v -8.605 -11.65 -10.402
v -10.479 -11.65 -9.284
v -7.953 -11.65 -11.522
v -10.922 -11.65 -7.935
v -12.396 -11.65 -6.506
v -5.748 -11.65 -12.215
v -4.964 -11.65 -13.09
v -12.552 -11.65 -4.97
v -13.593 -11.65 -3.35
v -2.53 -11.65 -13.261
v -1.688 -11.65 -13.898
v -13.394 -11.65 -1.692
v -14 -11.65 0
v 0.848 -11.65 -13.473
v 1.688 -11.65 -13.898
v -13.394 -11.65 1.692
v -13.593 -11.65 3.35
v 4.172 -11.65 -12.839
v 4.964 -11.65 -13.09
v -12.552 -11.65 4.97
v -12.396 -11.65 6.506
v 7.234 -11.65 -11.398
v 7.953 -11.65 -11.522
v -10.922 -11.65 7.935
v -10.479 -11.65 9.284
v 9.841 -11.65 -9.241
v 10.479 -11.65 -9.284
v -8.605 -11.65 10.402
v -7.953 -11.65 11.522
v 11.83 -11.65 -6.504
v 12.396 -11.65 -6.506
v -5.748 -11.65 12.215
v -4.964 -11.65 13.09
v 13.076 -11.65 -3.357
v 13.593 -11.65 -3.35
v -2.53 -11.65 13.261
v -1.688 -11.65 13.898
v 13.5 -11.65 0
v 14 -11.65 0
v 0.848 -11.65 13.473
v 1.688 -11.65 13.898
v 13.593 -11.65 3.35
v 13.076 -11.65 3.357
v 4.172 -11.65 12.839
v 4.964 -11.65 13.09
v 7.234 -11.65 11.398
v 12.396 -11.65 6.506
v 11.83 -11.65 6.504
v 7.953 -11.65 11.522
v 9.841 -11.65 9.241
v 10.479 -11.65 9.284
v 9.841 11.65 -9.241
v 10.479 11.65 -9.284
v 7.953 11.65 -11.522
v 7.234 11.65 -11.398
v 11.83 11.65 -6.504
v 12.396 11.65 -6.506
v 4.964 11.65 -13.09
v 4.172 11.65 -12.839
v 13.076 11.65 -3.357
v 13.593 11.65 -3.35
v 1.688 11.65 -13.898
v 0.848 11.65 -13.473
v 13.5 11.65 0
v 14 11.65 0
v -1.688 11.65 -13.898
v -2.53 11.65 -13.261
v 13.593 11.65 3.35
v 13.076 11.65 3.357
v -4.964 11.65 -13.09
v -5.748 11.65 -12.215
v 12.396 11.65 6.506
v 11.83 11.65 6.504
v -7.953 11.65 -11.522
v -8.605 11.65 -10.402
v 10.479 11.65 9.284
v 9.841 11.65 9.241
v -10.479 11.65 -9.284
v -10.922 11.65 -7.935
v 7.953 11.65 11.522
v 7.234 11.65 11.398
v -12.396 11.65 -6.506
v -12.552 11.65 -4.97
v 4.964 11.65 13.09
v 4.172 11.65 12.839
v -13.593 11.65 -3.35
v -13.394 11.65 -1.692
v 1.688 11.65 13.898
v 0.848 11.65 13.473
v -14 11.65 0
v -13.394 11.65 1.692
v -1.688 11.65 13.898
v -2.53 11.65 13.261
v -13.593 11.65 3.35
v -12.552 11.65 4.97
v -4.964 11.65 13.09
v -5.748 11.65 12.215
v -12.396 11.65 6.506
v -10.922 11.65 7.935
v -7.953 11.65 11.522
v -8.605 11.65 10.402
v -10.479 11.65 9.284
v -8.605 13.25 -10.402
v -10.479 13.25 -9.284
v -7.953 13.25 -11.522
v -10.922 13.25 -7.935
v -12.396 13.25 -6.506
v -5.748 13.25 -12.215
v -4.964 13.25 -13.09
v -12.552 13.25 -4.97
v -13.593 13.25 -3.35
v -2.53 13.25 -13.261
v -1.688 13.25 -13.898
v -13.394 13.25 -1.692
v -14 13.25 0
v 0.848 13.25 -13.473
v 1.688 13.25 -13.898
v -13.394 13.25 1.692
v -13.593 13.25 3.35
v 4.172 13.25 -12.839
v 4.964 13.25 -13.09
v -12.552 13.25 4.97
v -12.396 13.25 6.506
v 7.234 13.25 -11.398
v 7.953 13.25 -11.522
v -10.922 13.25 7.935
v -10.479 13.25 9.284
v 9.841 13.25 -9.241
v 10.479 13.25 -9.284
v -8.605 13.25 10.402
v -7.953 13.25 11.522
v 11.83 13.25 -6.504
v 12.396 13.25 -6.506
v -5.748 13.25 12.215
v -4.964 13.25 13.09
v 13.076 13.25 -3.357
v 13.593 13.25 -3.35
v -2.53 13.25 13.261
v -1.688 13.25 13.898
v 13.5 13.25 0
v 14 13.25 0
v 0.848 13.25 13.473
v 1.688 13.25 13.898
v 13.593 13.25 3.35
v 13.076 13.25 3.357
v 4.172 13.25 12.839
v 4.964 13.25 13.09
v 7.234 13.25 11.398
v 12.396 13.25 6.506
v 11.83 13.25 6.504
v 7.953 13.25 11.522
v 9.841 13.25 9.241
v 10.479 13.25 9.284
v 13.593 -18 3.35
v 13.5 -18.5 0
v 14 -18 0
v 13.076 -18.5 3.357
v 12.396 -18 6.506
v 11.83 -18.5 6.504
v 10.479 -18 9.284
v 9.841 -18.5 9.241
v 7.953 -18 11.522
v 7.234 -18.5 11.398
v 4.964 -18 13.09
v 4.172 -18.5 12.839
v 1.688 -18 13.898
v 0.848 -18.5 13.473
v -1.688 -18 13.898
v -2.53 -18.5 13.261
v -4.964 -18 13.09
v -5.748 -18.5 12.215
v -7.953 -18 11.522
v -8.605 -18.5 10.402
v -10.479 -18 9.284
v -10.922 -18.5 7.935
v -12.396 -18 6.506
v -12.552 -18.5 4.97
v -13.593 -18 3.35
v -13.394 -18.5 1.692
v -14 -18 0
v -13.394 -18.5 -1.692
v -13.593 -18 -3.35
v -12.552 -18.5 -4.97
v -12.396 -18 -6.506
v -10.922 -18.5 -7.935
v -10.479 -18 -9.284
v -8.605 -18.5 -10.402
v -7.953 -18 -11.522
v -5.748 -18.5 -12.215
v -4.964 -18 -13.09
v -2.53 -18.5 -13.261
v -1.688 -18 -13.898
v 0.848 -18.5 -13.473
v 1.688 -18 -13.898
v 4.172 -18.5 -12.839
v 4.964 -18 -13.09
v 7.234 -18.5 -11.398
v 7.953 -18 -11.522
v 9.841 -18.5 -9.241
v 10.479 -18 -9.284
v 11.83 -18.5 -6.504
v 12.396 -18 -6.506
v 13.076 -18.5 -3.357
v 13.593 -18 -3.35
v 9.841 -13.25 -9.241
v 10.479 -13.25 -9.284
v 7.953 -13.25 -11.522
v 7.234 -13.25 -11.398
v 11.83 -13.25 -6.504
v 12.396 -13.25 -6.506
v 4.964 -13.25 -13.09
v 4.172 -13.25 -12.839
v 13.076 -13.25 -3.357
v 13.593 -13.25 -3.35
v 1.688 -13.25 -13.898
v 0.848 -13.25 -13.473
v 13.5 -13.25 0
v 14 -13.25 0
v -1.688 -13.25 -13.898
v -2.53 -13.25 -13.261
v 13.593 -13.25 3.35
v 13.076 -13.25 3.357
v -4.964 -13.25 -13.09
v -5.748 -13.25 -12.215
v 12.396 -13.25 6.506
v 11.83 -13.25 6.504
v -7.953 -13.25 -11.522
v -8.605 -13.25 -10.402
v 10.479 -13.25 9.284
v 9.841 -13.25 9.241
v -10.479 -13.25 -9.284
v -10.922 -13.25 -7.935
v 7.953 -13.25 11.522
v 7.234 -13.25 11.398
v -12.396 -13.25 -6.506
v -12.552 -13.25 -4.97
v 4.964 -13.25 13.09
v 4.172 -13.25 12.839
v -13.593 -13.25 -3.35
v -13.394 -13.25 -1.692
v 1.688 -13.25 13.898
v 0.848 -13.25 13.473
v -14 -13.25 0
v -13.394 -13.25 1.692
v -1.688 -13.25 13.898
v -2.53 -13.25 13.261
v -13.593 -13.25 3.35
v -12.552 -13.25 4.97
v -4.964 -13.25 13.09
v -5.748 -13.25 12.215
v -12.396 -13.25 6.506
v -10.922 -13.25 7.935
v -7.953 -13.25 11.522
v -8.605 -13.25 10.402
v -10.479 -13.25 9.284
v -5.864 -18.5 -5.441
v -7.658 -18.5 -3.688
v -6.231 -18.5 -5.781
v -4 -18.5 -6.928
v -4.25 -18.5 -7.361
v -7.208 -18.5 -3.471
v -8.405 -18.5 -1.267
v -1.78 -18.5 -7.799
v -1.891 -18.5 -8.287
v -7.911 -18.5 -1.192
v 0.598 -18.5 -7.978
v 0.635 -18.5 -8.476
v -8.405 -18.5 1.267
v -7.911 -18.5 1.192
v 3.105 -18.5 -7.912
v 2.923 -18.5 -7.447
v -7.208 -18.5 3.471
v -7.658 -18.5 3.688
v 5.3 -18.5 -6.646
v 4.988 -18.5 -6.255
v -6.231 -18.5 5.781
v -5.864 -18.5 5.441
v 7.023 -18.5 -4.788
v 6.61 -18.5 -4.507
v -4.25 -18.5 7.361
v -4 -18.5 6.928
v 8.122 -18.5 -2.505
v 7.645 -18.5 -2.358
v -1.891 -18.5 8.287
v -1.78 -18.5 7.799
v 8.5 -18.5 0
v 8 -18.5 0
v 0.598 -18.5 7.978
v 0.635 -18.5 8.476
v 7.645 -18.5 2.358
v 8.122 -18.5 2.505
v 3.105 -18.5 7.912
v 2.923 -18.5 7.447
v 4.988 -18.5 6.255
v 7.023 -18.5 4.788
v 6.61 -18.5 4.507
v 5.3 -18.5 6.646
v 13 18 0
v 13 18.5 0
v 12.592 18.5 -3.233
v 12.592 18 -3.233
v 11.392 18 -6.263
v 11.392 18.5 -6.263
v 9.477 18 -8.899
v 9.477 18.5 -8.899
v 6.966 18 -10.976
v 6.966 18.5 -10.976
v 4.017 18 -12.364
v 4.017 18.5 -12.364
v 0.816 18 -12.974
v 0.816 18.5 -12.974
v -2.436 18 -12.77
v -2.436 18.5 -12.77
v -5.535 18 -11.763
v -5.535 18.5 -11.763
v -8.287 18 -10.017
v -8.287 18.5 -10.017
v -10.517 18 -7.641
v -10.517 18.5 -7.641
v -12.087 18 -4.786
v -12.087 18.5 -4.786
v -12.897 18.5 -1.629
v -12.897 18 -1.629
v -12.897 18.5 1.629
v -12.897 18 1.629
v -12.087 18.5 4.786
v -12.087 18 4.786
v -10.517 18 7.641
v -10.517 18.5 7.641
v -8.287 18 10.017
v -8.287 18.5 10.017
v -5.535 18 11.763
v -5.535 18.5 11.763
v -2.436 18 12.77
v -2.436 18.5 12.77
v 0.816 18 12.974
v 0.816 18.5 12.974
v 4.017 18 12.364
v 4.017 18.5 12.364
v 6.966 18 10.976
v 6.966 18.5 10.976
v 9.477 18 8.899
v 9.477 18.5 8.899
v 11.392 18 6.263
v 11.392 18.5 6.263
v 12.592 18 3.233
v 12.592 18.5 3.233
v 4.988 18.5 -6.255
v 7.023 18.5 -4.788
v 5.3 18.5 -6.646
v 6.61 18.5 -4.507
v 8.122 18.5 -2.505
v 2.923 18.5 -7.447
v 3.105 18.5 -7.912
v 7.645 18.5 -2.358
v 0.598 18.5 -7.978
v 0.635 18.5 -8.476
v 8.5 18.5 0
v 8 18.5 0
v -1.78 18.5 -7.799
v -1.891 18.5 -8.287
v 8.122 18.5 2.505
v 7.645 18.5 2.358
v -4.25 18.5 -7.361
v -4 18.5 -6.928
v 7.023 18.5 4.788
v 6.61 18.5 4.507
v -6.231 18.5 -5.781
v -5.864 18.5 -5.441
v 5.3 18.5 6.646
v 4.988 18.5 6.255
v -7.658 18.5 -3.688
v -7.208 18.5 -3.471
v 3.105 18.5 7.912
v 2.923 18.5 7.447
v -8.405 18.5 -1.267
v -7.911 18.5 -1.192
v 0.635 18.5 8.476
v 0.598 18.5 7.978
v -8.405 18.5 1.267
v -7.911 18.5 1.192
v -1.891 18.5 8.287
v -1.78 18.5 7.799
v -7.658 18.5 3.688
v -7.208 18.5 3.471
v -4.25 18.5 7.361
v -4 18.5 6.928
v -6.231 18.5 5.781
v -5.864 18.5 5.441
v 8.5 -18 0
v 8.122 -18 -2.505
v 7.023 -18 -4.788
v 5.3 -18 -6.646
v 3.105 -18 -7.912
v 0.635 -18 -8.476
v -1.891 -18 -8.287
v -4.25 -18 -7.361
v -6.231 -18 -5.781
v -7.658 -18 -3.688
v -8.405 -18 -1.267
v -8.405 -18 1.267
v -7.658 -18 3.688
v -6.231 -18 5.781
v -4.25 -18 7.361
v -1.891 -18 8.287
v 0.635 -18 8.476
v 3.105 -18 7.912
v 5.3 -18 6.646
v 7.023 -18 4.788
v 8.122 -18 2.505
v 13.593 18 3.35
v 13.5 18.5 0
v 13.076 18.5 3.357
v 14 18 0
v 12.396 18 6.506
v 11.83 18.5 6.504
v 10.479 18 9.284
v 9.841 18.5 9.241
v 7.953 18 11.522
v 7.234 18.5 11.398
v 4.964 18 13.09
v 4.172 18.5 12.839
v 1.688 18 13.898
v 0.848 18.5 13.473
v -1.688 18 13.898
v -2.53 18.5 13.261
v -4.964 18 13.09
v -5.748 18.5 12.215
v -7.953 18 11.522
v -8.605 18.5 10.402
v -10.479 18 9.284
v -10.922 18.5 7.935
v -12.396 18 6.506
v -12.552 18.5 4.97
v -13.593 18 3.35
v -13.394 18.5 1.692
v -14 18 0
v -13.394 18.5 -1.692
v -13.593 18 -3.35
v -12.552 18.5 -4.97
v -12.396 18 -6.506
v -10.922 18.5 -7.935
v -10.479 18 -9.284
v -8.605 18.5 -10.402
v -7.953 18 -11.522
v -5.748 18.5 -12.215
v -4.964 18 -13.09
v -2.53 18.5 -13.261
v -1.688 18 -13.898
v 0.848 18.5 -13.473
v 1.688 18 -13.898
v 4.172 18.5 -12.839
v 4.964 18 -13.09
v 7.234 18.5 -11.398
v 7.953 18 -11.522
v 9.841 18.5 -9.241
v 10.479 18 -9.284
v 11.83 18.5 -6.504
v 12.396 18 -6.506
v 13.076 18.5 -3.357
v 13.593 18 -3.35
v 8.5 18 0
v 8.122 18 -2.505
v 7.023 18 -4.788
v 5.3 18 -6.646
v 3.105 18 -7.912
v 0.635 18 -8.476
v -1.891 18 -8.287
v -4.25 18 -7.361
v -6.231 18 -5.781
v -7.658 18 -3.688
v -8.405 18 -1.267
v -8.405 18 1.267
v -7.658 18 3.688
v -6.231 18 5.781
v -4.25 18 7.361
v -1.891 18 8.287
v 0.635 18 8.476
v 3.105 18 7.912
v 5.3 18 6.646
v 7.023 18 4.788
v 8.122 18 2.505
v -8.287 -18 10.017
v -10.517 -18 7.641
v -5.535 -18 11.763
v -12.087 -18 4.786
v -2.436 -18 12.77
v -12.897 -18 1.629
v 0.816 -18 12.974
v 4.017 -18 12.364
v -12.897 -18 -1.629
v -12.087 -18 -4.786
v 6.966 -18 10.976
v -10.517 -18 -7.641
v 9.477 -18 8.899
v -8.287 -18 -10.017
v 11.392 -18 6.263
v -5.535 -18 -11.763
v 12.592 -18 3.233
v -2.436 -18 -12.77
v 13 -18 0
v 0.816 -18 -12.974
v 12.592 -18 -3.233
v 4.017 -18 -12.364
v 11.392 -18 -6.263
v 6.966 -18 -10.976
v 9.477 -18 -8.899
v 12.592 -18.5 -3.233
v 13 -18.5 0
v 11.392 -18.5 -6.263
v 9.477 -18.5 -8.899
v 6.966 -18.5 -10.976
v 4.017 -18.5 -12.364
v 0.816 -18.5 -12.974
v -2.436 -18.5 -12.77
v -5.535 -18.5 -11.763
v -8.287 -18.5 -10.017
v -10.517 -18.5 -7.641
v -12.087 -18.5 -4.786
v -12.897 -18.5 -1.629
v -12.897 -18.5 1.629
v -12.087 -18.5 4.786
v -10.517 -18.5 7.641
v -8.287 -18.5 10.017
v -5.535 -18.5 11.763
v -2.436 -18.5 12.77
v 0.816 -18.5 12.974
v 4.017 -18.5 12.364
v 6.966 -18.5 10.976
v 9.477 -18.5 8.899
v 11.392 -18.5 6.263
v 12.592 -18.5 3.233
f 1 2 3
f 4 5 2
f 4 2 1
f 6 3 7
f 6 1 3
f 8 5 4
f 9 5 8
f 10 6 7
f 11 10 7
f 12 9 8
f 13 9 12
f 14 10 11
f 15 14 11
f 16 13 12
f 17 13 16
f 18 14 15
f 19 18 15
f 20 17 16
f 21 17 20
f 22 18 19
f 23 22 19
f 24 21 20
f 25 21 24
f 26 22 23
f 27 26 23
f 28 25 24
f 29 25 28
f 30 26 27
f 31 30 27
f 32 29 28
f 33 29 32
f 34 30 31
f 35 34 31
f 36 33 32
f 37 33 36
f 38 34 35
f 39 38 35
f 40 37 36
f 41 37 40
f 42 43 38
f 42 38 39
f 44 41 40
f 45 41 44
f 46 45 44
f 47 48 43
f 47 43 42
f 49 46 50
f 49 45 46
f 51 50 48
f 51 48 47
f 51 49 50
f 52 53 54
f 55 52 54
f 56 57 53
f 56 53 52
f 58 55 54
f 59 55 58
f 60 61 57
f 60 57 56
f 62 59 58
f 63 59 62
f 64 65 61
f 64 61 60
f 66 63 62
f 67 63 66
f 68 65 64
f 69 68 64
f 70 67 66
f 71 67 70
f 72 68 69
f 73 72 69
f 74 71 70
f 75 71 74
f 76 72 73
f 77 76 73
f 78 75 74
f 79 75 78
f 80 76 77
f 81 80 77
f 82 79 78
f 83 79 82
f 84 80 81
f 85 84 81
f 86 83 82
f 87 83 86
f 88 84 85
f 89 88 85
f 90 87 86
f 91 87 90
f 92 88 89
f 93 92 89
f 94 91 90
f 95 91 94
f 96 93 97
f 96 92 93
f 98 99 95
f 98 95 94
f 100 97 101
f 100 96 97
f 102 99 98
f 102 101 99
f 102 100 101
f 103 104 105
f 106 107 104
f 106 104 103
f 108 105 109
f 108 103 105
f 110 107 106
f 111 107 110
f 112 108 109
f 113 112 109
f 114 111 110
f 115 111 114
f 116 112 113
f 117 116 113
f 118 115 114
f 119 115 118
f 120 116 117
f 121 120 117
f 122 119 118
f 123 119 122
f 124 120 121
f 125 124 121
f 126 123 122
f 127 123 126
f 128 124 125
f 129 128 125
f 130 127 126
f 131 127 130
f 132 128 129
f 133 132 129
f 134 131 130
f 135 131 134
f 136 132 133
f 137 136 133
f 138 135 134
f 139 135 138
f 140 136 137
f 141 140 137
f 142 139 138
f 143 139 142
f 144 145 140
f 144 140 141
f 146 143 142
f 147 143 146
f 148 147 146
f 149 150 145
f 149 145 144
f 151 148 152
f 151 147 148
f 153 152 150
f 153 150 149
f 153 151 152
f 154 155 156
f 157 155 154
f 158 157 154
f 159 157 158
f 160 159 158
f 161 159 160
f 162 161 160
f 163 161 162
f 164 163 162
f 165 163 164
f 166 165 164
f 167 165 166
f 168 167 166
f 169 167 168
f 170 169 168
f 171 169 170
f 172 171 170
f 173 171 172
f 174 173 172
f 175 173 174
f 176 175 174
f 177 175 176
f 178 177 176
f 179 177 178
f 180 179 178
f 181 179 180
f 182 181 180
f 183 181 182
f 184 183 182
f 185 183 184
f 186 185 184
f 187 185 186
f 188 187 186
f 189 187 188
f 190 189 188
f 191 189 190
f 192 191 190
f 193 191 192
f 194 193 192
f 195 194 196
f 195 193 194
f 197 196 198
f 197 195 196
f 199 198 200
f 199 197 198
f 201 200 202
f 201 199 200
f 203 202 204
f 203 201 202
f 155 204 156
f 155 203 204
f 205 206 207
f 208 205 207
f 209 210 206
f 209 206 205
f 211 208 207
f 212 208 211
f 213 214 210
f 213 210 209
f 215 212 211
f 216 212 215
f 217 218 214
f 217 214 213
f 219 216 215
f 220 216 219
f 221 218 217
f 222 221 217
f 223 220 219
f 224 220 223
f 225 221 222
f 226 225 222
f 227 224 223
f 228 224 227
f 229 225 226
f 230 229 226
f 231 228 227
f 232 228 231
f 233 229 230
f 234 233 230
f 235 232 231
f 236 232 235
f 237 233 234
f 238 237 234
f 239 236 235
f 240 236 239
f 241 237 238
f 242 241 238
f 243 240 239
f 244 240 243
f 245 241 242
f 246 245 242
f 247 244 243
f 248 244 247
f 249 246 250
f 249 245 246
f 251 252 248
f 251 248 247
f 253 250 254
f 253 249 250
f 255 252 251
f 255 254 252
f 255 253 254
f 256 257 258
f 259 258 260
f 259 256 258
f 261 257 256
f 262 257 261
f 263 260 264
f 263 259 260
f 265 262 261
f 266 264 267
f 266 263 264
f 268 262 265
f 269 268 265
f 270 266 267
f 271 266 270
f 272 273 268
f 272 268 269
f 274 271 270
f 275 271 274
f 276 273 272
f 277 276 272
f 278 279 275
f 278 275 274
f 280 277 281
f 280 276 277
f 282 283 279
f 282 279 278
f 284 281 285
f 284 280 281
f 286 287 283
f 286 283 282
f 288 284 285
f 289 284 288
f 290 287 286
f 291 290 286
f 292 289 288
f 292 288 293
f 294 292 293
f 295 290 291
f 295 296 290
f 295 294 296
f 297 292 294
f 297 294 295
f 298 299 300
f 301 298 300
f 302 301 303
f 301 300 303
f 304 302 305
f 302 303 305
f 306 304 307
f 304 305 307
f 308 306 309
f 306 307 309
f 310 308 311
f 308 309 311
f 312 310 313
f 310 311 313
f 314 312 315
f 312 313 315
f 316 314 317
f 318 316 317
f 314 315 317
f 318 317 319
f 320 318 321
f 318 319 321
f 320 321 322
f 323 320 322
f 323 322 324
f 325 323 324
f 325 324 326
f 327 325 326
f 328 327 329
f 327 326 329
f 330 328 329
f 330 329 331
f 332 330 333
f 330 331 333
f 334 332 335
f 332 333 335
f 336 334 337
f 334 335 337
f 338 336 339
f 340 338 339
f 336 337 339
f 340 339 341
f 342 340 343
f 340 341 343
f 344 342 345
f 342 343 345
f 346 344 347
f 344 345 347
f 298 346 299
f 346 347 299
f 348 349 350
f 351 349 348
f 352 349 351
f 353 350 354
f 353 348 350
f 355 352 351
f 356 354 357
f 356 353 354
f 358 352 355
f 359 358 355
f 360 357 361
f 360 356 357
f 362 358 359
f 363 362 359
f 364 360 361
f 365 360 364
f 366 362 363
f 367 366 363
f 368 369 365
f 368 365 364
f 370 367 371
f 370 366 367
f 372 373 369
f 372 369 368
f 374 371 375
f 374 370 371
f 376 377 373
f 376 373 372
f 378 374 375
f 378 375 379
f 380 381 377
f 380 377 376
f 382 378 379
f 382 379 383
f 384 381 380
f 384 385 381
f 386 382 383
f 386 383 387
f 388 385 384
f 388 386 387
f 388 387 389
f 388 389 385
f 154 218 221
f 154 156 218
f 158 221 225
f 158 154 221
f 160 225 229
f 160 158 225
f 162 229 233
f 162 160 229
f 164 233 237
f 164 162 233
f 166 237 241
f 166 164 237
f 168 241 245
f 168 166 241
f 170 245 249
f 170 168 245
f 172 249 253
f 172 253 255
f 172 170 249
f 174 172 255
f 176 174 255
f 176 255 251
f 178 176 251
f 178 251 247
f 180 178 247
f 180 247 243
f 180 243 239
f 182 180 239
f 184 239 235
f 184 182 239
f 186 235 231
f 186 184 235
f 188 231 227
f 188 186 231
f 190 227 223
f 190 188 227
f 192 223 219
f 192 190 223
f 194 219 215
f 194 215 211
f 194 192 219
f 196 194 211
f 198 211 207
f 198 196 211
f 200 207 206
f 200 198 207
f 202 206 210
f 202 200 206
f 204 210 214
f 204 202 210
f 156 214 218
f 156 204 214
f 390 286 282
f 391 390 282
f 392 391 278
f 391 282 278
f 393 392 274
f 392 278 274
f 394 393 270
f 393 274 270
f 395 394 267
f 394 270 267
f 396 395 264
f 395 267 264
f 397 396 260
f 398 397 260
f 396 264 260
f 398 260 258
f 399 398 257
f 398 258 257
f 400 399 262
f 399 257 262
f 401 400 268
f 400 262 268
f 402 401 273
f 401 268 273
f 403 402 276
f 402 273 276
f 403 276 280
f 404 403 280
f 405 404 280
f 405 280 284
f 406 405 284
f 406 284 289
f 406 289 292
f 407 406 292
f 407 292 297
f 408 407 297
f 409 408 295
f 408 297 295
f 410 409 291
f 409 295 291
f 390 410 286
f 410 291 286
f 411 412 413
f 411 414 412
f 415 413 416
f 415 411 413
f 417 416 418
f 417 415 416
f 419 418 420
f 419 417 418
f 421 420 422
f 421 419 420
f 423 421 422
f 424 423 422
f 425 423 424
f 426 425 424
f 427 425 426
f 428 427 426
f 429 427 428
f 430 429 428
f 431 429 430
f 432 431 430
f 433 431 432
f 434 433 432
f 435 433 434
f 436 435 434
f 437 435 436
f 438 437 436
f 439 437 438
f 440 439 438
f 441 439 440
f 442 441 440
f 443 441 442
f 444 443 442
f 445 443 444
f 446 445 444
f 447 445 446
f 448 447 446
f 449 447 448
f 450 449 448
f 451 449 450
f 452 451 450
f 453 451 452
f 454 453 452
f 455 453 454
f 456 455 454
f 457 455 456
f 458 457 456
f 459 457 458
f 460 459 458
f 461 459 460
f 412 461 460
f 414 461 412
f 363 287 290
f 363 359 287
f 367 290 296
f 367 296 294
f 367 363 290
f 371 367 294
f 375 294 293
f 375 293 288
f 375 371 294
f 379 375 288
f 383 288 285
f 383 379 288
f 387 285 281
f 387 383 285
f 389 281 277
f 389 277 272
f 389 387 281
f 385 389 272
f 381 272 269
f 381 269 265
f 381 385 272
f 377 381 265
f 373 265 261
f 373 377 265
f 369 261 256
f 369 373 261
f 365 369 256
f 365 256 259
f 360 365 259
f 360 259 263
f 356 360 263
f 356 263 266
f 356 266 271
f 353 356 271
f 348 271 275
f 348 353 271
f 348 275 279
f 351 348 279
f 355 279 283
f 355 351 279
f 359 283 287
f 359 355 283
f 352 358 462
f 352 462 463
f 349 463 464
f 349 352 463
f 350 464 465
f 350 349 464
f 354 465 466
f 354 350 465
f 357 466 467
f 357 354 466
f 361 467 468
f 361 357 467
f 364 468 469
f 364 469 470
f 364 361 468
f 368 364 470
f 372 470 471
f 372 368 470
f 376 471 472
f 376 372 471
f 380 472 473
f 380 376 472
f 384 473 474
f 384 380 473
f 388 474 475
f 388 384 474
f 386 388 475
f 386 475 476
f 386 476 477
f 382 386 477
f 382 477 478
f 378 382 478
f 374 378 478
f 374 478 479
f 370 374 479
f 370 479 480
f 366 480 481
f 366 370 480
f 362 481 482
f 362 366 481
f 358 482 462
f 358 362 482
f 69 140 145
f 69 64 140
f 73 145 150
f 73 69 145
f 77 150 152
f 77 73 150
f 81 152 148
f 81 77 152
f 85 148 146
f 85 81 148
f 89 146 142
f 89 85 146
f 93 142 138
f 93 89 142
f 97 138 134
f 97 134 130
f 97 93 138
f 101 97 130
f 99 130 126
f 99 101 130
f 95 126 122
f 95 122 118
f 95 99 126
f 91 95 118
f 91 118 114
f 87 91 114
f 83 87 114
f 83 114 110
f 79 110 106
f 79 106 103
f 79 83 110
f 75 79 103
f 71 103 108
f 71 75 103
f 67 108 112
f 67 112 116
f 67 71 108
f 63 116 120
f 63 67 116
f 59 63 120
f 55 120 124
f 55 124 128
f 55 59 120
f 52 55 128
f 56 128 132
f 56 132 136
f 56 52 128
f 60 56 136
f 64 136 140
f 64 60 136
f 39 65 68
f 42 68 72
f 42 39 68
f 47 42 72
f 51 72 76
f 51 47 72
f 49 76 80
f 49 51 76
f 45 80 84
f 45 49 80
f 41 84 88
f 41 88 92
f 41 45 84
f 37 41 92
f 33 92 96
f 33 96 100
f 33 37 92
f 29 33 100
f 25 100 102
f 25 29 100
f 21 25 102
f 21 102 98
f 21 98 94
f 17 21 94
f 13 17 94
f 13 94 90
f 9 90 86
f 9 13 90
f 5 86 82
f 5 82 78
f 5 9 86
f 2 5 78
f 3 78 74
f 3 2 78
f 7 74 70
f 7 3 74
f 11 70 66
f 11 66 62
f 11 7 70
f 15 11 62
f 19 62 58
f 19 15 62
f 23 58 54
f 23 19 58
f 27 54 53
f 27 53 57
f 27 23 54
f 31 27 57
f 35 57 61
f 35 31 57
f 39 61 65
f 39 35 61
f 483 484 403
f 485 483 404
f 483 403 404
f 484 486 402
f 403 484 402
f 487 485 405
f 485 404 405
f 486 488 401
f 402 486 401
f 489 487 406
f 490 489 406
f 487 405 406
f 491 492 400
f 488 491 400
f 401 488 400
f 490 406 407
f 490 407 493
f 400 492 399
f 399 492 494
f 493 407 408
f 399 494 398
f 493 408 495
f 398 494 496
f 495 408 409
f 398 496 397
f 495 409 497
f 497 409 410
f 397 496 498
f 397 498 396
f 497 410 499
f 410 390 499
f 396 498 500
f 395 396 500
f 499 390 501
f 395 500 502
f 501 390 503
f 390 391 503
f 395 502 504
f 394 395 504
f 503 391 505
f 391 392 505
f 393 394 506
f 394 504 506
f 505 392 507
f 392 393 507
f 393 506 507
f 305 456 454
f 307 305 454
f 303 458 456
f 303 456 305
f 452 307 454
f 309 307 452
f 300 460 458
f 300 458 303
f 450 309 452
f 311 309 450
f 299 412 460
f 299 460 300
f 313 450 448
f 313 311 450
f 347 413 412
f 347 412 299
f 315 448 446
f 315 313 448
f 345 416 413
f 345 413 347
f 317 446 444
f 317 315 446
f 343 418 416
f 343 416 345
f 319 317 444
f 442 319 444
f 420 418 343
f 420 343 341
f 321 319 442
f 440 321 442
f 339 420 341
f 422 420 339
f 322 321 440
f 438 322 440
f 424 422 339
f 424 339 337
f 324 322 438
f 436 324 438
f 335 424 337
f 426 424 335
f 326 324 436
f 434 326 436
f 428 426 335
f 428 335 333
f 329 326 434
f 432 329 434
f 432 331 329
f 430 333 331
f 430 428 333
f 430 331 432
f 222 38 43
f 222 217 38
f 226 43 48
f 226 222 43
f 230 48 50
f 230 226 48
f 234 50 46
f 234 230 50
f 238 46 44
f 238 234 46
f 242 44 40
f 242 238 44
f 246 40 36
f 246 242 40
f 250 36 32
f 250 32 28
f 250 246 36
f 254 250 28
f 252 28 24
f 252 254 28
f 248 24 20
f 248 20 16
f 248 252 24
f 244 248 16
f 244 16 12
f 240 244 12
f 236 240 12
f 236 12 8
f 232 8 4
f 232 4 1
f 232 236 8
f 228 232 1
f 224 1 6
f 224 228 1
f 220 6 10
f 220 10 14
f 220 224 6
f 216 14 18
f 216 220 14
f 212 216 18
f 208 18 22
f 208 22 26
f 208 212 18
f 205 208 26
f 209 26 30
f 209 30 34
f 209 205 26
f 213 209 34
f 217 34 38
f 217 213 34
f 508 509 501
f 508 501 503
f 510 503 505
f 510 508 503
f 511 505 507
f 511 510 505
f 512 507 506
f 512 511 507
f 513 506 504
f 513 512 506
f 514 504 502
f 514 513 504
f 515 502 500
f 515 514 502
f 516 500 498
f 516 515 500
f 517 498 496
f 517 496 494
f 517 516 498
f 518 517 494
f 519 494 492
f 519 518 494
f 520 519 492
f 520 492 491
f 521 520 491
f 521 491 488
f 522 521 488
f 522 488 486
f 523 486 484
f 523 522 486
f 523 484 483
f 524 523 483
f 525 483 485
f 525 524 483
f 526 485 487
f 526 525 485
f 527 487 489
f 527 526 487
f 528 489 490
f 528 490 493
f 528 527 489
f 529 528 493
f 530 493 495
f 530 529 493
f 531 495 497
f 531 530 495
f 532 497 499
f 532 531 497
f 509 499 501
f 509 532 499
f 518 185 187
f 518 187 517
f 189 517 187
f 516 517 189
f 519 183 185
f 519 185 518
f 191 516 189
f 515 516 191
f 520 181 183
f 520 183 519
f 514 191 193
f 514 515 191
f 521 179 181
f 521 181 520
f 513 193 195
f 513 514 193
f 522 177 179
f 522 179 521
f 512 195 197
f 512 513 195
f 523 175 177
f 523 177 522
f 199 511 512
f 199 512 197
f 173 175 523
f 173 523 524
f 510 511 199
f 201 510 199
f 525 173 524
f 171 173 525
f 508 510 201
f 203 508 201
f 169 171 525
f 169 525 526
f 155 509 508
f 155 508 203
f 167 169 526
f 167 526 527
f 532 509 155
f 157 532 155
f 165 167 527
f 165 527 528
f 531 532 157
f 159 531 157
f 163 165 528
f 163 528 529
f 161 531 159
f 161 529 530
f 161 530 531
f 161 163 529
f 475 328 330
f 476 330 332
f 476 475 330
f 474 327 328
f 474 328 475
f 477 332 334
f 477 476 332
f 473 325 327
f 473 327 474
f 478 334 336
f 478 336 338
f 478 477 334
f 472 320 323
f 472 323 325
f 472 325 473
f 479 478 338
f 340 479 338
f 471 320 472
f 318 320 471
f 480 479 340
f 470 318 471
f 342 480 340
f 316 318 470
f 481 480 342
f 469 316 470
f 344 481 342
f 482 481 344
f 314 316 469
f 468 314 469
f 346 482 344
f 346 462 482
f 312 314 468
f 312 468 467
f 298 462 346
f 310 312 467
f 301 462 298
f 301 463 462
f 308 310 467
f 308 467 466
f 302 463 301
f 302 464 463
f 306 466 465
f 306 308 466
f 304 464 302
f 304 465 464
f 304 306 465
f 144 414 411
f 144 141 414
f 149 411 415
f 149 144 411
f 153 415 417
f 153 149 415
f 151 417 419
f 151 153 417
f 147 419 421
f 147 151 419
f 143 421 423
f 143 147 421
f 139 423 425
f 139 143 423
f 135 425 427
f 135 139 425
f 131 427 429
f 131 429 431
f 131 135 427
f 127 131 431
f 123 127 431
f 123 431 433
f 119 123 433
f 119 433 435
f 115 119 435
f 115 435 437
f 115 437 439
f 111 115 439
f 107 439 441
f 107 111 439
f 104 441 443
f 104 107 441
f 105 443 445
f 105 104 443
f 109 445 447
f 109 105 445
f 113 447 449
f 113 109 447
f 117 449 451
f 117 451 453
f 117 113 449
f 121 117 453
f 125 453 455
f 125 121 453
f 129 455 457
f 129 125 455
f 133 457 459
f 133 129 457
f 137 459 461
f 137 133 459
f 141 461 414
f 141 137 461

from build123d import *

# Parameters (mm, degrees)
SKETCH2_R          = 13
SKETCH2_R_2        = 8.5
CUT_EXTRUDE1_DEPTH = 0.5


with BuildPart() as part:
    # Sketch1 → Revolve1 (revolve)
    with BuildSketch(Plane.XY):
        Polygon((8, -18.5), (8, 18.5), (13.5, 18.5), (14, 18), (14, 13.25), (13.5, 13.25), (13.5, 11.65), (14, 11.65), (14, -11.65), (13.5, -11.65), (13.5, -13.25), (14, -13.25), (14, -18), (13.5, -18.5), align=None)
    revolve(axis=Axis((0, 18.5, 0), (0, -1, 0)))

    # Sketch2 → Cut-Extrude1 (cut)
    with BuildSketch(Plane(origin=(0, 18.5, 0), x_dir=(1, 0, 0), z_dir=(0, 1, 0))):
        Circle(SKETCH2_R)
        Circle(SKETCH2_R_2, mode=Mode.SUBTRACT)
    cut_extrude1 = extrude(amount=-CUT_EXTRUDE1_DEPTH, mode=Mode.SUBTRACT)

    # Mirror1: Cut-Extrude1 across plane
    add(cut_extrude1.mirror(Plane.ZX), mode=Mode.SUBTRACT)


solid = part.part
